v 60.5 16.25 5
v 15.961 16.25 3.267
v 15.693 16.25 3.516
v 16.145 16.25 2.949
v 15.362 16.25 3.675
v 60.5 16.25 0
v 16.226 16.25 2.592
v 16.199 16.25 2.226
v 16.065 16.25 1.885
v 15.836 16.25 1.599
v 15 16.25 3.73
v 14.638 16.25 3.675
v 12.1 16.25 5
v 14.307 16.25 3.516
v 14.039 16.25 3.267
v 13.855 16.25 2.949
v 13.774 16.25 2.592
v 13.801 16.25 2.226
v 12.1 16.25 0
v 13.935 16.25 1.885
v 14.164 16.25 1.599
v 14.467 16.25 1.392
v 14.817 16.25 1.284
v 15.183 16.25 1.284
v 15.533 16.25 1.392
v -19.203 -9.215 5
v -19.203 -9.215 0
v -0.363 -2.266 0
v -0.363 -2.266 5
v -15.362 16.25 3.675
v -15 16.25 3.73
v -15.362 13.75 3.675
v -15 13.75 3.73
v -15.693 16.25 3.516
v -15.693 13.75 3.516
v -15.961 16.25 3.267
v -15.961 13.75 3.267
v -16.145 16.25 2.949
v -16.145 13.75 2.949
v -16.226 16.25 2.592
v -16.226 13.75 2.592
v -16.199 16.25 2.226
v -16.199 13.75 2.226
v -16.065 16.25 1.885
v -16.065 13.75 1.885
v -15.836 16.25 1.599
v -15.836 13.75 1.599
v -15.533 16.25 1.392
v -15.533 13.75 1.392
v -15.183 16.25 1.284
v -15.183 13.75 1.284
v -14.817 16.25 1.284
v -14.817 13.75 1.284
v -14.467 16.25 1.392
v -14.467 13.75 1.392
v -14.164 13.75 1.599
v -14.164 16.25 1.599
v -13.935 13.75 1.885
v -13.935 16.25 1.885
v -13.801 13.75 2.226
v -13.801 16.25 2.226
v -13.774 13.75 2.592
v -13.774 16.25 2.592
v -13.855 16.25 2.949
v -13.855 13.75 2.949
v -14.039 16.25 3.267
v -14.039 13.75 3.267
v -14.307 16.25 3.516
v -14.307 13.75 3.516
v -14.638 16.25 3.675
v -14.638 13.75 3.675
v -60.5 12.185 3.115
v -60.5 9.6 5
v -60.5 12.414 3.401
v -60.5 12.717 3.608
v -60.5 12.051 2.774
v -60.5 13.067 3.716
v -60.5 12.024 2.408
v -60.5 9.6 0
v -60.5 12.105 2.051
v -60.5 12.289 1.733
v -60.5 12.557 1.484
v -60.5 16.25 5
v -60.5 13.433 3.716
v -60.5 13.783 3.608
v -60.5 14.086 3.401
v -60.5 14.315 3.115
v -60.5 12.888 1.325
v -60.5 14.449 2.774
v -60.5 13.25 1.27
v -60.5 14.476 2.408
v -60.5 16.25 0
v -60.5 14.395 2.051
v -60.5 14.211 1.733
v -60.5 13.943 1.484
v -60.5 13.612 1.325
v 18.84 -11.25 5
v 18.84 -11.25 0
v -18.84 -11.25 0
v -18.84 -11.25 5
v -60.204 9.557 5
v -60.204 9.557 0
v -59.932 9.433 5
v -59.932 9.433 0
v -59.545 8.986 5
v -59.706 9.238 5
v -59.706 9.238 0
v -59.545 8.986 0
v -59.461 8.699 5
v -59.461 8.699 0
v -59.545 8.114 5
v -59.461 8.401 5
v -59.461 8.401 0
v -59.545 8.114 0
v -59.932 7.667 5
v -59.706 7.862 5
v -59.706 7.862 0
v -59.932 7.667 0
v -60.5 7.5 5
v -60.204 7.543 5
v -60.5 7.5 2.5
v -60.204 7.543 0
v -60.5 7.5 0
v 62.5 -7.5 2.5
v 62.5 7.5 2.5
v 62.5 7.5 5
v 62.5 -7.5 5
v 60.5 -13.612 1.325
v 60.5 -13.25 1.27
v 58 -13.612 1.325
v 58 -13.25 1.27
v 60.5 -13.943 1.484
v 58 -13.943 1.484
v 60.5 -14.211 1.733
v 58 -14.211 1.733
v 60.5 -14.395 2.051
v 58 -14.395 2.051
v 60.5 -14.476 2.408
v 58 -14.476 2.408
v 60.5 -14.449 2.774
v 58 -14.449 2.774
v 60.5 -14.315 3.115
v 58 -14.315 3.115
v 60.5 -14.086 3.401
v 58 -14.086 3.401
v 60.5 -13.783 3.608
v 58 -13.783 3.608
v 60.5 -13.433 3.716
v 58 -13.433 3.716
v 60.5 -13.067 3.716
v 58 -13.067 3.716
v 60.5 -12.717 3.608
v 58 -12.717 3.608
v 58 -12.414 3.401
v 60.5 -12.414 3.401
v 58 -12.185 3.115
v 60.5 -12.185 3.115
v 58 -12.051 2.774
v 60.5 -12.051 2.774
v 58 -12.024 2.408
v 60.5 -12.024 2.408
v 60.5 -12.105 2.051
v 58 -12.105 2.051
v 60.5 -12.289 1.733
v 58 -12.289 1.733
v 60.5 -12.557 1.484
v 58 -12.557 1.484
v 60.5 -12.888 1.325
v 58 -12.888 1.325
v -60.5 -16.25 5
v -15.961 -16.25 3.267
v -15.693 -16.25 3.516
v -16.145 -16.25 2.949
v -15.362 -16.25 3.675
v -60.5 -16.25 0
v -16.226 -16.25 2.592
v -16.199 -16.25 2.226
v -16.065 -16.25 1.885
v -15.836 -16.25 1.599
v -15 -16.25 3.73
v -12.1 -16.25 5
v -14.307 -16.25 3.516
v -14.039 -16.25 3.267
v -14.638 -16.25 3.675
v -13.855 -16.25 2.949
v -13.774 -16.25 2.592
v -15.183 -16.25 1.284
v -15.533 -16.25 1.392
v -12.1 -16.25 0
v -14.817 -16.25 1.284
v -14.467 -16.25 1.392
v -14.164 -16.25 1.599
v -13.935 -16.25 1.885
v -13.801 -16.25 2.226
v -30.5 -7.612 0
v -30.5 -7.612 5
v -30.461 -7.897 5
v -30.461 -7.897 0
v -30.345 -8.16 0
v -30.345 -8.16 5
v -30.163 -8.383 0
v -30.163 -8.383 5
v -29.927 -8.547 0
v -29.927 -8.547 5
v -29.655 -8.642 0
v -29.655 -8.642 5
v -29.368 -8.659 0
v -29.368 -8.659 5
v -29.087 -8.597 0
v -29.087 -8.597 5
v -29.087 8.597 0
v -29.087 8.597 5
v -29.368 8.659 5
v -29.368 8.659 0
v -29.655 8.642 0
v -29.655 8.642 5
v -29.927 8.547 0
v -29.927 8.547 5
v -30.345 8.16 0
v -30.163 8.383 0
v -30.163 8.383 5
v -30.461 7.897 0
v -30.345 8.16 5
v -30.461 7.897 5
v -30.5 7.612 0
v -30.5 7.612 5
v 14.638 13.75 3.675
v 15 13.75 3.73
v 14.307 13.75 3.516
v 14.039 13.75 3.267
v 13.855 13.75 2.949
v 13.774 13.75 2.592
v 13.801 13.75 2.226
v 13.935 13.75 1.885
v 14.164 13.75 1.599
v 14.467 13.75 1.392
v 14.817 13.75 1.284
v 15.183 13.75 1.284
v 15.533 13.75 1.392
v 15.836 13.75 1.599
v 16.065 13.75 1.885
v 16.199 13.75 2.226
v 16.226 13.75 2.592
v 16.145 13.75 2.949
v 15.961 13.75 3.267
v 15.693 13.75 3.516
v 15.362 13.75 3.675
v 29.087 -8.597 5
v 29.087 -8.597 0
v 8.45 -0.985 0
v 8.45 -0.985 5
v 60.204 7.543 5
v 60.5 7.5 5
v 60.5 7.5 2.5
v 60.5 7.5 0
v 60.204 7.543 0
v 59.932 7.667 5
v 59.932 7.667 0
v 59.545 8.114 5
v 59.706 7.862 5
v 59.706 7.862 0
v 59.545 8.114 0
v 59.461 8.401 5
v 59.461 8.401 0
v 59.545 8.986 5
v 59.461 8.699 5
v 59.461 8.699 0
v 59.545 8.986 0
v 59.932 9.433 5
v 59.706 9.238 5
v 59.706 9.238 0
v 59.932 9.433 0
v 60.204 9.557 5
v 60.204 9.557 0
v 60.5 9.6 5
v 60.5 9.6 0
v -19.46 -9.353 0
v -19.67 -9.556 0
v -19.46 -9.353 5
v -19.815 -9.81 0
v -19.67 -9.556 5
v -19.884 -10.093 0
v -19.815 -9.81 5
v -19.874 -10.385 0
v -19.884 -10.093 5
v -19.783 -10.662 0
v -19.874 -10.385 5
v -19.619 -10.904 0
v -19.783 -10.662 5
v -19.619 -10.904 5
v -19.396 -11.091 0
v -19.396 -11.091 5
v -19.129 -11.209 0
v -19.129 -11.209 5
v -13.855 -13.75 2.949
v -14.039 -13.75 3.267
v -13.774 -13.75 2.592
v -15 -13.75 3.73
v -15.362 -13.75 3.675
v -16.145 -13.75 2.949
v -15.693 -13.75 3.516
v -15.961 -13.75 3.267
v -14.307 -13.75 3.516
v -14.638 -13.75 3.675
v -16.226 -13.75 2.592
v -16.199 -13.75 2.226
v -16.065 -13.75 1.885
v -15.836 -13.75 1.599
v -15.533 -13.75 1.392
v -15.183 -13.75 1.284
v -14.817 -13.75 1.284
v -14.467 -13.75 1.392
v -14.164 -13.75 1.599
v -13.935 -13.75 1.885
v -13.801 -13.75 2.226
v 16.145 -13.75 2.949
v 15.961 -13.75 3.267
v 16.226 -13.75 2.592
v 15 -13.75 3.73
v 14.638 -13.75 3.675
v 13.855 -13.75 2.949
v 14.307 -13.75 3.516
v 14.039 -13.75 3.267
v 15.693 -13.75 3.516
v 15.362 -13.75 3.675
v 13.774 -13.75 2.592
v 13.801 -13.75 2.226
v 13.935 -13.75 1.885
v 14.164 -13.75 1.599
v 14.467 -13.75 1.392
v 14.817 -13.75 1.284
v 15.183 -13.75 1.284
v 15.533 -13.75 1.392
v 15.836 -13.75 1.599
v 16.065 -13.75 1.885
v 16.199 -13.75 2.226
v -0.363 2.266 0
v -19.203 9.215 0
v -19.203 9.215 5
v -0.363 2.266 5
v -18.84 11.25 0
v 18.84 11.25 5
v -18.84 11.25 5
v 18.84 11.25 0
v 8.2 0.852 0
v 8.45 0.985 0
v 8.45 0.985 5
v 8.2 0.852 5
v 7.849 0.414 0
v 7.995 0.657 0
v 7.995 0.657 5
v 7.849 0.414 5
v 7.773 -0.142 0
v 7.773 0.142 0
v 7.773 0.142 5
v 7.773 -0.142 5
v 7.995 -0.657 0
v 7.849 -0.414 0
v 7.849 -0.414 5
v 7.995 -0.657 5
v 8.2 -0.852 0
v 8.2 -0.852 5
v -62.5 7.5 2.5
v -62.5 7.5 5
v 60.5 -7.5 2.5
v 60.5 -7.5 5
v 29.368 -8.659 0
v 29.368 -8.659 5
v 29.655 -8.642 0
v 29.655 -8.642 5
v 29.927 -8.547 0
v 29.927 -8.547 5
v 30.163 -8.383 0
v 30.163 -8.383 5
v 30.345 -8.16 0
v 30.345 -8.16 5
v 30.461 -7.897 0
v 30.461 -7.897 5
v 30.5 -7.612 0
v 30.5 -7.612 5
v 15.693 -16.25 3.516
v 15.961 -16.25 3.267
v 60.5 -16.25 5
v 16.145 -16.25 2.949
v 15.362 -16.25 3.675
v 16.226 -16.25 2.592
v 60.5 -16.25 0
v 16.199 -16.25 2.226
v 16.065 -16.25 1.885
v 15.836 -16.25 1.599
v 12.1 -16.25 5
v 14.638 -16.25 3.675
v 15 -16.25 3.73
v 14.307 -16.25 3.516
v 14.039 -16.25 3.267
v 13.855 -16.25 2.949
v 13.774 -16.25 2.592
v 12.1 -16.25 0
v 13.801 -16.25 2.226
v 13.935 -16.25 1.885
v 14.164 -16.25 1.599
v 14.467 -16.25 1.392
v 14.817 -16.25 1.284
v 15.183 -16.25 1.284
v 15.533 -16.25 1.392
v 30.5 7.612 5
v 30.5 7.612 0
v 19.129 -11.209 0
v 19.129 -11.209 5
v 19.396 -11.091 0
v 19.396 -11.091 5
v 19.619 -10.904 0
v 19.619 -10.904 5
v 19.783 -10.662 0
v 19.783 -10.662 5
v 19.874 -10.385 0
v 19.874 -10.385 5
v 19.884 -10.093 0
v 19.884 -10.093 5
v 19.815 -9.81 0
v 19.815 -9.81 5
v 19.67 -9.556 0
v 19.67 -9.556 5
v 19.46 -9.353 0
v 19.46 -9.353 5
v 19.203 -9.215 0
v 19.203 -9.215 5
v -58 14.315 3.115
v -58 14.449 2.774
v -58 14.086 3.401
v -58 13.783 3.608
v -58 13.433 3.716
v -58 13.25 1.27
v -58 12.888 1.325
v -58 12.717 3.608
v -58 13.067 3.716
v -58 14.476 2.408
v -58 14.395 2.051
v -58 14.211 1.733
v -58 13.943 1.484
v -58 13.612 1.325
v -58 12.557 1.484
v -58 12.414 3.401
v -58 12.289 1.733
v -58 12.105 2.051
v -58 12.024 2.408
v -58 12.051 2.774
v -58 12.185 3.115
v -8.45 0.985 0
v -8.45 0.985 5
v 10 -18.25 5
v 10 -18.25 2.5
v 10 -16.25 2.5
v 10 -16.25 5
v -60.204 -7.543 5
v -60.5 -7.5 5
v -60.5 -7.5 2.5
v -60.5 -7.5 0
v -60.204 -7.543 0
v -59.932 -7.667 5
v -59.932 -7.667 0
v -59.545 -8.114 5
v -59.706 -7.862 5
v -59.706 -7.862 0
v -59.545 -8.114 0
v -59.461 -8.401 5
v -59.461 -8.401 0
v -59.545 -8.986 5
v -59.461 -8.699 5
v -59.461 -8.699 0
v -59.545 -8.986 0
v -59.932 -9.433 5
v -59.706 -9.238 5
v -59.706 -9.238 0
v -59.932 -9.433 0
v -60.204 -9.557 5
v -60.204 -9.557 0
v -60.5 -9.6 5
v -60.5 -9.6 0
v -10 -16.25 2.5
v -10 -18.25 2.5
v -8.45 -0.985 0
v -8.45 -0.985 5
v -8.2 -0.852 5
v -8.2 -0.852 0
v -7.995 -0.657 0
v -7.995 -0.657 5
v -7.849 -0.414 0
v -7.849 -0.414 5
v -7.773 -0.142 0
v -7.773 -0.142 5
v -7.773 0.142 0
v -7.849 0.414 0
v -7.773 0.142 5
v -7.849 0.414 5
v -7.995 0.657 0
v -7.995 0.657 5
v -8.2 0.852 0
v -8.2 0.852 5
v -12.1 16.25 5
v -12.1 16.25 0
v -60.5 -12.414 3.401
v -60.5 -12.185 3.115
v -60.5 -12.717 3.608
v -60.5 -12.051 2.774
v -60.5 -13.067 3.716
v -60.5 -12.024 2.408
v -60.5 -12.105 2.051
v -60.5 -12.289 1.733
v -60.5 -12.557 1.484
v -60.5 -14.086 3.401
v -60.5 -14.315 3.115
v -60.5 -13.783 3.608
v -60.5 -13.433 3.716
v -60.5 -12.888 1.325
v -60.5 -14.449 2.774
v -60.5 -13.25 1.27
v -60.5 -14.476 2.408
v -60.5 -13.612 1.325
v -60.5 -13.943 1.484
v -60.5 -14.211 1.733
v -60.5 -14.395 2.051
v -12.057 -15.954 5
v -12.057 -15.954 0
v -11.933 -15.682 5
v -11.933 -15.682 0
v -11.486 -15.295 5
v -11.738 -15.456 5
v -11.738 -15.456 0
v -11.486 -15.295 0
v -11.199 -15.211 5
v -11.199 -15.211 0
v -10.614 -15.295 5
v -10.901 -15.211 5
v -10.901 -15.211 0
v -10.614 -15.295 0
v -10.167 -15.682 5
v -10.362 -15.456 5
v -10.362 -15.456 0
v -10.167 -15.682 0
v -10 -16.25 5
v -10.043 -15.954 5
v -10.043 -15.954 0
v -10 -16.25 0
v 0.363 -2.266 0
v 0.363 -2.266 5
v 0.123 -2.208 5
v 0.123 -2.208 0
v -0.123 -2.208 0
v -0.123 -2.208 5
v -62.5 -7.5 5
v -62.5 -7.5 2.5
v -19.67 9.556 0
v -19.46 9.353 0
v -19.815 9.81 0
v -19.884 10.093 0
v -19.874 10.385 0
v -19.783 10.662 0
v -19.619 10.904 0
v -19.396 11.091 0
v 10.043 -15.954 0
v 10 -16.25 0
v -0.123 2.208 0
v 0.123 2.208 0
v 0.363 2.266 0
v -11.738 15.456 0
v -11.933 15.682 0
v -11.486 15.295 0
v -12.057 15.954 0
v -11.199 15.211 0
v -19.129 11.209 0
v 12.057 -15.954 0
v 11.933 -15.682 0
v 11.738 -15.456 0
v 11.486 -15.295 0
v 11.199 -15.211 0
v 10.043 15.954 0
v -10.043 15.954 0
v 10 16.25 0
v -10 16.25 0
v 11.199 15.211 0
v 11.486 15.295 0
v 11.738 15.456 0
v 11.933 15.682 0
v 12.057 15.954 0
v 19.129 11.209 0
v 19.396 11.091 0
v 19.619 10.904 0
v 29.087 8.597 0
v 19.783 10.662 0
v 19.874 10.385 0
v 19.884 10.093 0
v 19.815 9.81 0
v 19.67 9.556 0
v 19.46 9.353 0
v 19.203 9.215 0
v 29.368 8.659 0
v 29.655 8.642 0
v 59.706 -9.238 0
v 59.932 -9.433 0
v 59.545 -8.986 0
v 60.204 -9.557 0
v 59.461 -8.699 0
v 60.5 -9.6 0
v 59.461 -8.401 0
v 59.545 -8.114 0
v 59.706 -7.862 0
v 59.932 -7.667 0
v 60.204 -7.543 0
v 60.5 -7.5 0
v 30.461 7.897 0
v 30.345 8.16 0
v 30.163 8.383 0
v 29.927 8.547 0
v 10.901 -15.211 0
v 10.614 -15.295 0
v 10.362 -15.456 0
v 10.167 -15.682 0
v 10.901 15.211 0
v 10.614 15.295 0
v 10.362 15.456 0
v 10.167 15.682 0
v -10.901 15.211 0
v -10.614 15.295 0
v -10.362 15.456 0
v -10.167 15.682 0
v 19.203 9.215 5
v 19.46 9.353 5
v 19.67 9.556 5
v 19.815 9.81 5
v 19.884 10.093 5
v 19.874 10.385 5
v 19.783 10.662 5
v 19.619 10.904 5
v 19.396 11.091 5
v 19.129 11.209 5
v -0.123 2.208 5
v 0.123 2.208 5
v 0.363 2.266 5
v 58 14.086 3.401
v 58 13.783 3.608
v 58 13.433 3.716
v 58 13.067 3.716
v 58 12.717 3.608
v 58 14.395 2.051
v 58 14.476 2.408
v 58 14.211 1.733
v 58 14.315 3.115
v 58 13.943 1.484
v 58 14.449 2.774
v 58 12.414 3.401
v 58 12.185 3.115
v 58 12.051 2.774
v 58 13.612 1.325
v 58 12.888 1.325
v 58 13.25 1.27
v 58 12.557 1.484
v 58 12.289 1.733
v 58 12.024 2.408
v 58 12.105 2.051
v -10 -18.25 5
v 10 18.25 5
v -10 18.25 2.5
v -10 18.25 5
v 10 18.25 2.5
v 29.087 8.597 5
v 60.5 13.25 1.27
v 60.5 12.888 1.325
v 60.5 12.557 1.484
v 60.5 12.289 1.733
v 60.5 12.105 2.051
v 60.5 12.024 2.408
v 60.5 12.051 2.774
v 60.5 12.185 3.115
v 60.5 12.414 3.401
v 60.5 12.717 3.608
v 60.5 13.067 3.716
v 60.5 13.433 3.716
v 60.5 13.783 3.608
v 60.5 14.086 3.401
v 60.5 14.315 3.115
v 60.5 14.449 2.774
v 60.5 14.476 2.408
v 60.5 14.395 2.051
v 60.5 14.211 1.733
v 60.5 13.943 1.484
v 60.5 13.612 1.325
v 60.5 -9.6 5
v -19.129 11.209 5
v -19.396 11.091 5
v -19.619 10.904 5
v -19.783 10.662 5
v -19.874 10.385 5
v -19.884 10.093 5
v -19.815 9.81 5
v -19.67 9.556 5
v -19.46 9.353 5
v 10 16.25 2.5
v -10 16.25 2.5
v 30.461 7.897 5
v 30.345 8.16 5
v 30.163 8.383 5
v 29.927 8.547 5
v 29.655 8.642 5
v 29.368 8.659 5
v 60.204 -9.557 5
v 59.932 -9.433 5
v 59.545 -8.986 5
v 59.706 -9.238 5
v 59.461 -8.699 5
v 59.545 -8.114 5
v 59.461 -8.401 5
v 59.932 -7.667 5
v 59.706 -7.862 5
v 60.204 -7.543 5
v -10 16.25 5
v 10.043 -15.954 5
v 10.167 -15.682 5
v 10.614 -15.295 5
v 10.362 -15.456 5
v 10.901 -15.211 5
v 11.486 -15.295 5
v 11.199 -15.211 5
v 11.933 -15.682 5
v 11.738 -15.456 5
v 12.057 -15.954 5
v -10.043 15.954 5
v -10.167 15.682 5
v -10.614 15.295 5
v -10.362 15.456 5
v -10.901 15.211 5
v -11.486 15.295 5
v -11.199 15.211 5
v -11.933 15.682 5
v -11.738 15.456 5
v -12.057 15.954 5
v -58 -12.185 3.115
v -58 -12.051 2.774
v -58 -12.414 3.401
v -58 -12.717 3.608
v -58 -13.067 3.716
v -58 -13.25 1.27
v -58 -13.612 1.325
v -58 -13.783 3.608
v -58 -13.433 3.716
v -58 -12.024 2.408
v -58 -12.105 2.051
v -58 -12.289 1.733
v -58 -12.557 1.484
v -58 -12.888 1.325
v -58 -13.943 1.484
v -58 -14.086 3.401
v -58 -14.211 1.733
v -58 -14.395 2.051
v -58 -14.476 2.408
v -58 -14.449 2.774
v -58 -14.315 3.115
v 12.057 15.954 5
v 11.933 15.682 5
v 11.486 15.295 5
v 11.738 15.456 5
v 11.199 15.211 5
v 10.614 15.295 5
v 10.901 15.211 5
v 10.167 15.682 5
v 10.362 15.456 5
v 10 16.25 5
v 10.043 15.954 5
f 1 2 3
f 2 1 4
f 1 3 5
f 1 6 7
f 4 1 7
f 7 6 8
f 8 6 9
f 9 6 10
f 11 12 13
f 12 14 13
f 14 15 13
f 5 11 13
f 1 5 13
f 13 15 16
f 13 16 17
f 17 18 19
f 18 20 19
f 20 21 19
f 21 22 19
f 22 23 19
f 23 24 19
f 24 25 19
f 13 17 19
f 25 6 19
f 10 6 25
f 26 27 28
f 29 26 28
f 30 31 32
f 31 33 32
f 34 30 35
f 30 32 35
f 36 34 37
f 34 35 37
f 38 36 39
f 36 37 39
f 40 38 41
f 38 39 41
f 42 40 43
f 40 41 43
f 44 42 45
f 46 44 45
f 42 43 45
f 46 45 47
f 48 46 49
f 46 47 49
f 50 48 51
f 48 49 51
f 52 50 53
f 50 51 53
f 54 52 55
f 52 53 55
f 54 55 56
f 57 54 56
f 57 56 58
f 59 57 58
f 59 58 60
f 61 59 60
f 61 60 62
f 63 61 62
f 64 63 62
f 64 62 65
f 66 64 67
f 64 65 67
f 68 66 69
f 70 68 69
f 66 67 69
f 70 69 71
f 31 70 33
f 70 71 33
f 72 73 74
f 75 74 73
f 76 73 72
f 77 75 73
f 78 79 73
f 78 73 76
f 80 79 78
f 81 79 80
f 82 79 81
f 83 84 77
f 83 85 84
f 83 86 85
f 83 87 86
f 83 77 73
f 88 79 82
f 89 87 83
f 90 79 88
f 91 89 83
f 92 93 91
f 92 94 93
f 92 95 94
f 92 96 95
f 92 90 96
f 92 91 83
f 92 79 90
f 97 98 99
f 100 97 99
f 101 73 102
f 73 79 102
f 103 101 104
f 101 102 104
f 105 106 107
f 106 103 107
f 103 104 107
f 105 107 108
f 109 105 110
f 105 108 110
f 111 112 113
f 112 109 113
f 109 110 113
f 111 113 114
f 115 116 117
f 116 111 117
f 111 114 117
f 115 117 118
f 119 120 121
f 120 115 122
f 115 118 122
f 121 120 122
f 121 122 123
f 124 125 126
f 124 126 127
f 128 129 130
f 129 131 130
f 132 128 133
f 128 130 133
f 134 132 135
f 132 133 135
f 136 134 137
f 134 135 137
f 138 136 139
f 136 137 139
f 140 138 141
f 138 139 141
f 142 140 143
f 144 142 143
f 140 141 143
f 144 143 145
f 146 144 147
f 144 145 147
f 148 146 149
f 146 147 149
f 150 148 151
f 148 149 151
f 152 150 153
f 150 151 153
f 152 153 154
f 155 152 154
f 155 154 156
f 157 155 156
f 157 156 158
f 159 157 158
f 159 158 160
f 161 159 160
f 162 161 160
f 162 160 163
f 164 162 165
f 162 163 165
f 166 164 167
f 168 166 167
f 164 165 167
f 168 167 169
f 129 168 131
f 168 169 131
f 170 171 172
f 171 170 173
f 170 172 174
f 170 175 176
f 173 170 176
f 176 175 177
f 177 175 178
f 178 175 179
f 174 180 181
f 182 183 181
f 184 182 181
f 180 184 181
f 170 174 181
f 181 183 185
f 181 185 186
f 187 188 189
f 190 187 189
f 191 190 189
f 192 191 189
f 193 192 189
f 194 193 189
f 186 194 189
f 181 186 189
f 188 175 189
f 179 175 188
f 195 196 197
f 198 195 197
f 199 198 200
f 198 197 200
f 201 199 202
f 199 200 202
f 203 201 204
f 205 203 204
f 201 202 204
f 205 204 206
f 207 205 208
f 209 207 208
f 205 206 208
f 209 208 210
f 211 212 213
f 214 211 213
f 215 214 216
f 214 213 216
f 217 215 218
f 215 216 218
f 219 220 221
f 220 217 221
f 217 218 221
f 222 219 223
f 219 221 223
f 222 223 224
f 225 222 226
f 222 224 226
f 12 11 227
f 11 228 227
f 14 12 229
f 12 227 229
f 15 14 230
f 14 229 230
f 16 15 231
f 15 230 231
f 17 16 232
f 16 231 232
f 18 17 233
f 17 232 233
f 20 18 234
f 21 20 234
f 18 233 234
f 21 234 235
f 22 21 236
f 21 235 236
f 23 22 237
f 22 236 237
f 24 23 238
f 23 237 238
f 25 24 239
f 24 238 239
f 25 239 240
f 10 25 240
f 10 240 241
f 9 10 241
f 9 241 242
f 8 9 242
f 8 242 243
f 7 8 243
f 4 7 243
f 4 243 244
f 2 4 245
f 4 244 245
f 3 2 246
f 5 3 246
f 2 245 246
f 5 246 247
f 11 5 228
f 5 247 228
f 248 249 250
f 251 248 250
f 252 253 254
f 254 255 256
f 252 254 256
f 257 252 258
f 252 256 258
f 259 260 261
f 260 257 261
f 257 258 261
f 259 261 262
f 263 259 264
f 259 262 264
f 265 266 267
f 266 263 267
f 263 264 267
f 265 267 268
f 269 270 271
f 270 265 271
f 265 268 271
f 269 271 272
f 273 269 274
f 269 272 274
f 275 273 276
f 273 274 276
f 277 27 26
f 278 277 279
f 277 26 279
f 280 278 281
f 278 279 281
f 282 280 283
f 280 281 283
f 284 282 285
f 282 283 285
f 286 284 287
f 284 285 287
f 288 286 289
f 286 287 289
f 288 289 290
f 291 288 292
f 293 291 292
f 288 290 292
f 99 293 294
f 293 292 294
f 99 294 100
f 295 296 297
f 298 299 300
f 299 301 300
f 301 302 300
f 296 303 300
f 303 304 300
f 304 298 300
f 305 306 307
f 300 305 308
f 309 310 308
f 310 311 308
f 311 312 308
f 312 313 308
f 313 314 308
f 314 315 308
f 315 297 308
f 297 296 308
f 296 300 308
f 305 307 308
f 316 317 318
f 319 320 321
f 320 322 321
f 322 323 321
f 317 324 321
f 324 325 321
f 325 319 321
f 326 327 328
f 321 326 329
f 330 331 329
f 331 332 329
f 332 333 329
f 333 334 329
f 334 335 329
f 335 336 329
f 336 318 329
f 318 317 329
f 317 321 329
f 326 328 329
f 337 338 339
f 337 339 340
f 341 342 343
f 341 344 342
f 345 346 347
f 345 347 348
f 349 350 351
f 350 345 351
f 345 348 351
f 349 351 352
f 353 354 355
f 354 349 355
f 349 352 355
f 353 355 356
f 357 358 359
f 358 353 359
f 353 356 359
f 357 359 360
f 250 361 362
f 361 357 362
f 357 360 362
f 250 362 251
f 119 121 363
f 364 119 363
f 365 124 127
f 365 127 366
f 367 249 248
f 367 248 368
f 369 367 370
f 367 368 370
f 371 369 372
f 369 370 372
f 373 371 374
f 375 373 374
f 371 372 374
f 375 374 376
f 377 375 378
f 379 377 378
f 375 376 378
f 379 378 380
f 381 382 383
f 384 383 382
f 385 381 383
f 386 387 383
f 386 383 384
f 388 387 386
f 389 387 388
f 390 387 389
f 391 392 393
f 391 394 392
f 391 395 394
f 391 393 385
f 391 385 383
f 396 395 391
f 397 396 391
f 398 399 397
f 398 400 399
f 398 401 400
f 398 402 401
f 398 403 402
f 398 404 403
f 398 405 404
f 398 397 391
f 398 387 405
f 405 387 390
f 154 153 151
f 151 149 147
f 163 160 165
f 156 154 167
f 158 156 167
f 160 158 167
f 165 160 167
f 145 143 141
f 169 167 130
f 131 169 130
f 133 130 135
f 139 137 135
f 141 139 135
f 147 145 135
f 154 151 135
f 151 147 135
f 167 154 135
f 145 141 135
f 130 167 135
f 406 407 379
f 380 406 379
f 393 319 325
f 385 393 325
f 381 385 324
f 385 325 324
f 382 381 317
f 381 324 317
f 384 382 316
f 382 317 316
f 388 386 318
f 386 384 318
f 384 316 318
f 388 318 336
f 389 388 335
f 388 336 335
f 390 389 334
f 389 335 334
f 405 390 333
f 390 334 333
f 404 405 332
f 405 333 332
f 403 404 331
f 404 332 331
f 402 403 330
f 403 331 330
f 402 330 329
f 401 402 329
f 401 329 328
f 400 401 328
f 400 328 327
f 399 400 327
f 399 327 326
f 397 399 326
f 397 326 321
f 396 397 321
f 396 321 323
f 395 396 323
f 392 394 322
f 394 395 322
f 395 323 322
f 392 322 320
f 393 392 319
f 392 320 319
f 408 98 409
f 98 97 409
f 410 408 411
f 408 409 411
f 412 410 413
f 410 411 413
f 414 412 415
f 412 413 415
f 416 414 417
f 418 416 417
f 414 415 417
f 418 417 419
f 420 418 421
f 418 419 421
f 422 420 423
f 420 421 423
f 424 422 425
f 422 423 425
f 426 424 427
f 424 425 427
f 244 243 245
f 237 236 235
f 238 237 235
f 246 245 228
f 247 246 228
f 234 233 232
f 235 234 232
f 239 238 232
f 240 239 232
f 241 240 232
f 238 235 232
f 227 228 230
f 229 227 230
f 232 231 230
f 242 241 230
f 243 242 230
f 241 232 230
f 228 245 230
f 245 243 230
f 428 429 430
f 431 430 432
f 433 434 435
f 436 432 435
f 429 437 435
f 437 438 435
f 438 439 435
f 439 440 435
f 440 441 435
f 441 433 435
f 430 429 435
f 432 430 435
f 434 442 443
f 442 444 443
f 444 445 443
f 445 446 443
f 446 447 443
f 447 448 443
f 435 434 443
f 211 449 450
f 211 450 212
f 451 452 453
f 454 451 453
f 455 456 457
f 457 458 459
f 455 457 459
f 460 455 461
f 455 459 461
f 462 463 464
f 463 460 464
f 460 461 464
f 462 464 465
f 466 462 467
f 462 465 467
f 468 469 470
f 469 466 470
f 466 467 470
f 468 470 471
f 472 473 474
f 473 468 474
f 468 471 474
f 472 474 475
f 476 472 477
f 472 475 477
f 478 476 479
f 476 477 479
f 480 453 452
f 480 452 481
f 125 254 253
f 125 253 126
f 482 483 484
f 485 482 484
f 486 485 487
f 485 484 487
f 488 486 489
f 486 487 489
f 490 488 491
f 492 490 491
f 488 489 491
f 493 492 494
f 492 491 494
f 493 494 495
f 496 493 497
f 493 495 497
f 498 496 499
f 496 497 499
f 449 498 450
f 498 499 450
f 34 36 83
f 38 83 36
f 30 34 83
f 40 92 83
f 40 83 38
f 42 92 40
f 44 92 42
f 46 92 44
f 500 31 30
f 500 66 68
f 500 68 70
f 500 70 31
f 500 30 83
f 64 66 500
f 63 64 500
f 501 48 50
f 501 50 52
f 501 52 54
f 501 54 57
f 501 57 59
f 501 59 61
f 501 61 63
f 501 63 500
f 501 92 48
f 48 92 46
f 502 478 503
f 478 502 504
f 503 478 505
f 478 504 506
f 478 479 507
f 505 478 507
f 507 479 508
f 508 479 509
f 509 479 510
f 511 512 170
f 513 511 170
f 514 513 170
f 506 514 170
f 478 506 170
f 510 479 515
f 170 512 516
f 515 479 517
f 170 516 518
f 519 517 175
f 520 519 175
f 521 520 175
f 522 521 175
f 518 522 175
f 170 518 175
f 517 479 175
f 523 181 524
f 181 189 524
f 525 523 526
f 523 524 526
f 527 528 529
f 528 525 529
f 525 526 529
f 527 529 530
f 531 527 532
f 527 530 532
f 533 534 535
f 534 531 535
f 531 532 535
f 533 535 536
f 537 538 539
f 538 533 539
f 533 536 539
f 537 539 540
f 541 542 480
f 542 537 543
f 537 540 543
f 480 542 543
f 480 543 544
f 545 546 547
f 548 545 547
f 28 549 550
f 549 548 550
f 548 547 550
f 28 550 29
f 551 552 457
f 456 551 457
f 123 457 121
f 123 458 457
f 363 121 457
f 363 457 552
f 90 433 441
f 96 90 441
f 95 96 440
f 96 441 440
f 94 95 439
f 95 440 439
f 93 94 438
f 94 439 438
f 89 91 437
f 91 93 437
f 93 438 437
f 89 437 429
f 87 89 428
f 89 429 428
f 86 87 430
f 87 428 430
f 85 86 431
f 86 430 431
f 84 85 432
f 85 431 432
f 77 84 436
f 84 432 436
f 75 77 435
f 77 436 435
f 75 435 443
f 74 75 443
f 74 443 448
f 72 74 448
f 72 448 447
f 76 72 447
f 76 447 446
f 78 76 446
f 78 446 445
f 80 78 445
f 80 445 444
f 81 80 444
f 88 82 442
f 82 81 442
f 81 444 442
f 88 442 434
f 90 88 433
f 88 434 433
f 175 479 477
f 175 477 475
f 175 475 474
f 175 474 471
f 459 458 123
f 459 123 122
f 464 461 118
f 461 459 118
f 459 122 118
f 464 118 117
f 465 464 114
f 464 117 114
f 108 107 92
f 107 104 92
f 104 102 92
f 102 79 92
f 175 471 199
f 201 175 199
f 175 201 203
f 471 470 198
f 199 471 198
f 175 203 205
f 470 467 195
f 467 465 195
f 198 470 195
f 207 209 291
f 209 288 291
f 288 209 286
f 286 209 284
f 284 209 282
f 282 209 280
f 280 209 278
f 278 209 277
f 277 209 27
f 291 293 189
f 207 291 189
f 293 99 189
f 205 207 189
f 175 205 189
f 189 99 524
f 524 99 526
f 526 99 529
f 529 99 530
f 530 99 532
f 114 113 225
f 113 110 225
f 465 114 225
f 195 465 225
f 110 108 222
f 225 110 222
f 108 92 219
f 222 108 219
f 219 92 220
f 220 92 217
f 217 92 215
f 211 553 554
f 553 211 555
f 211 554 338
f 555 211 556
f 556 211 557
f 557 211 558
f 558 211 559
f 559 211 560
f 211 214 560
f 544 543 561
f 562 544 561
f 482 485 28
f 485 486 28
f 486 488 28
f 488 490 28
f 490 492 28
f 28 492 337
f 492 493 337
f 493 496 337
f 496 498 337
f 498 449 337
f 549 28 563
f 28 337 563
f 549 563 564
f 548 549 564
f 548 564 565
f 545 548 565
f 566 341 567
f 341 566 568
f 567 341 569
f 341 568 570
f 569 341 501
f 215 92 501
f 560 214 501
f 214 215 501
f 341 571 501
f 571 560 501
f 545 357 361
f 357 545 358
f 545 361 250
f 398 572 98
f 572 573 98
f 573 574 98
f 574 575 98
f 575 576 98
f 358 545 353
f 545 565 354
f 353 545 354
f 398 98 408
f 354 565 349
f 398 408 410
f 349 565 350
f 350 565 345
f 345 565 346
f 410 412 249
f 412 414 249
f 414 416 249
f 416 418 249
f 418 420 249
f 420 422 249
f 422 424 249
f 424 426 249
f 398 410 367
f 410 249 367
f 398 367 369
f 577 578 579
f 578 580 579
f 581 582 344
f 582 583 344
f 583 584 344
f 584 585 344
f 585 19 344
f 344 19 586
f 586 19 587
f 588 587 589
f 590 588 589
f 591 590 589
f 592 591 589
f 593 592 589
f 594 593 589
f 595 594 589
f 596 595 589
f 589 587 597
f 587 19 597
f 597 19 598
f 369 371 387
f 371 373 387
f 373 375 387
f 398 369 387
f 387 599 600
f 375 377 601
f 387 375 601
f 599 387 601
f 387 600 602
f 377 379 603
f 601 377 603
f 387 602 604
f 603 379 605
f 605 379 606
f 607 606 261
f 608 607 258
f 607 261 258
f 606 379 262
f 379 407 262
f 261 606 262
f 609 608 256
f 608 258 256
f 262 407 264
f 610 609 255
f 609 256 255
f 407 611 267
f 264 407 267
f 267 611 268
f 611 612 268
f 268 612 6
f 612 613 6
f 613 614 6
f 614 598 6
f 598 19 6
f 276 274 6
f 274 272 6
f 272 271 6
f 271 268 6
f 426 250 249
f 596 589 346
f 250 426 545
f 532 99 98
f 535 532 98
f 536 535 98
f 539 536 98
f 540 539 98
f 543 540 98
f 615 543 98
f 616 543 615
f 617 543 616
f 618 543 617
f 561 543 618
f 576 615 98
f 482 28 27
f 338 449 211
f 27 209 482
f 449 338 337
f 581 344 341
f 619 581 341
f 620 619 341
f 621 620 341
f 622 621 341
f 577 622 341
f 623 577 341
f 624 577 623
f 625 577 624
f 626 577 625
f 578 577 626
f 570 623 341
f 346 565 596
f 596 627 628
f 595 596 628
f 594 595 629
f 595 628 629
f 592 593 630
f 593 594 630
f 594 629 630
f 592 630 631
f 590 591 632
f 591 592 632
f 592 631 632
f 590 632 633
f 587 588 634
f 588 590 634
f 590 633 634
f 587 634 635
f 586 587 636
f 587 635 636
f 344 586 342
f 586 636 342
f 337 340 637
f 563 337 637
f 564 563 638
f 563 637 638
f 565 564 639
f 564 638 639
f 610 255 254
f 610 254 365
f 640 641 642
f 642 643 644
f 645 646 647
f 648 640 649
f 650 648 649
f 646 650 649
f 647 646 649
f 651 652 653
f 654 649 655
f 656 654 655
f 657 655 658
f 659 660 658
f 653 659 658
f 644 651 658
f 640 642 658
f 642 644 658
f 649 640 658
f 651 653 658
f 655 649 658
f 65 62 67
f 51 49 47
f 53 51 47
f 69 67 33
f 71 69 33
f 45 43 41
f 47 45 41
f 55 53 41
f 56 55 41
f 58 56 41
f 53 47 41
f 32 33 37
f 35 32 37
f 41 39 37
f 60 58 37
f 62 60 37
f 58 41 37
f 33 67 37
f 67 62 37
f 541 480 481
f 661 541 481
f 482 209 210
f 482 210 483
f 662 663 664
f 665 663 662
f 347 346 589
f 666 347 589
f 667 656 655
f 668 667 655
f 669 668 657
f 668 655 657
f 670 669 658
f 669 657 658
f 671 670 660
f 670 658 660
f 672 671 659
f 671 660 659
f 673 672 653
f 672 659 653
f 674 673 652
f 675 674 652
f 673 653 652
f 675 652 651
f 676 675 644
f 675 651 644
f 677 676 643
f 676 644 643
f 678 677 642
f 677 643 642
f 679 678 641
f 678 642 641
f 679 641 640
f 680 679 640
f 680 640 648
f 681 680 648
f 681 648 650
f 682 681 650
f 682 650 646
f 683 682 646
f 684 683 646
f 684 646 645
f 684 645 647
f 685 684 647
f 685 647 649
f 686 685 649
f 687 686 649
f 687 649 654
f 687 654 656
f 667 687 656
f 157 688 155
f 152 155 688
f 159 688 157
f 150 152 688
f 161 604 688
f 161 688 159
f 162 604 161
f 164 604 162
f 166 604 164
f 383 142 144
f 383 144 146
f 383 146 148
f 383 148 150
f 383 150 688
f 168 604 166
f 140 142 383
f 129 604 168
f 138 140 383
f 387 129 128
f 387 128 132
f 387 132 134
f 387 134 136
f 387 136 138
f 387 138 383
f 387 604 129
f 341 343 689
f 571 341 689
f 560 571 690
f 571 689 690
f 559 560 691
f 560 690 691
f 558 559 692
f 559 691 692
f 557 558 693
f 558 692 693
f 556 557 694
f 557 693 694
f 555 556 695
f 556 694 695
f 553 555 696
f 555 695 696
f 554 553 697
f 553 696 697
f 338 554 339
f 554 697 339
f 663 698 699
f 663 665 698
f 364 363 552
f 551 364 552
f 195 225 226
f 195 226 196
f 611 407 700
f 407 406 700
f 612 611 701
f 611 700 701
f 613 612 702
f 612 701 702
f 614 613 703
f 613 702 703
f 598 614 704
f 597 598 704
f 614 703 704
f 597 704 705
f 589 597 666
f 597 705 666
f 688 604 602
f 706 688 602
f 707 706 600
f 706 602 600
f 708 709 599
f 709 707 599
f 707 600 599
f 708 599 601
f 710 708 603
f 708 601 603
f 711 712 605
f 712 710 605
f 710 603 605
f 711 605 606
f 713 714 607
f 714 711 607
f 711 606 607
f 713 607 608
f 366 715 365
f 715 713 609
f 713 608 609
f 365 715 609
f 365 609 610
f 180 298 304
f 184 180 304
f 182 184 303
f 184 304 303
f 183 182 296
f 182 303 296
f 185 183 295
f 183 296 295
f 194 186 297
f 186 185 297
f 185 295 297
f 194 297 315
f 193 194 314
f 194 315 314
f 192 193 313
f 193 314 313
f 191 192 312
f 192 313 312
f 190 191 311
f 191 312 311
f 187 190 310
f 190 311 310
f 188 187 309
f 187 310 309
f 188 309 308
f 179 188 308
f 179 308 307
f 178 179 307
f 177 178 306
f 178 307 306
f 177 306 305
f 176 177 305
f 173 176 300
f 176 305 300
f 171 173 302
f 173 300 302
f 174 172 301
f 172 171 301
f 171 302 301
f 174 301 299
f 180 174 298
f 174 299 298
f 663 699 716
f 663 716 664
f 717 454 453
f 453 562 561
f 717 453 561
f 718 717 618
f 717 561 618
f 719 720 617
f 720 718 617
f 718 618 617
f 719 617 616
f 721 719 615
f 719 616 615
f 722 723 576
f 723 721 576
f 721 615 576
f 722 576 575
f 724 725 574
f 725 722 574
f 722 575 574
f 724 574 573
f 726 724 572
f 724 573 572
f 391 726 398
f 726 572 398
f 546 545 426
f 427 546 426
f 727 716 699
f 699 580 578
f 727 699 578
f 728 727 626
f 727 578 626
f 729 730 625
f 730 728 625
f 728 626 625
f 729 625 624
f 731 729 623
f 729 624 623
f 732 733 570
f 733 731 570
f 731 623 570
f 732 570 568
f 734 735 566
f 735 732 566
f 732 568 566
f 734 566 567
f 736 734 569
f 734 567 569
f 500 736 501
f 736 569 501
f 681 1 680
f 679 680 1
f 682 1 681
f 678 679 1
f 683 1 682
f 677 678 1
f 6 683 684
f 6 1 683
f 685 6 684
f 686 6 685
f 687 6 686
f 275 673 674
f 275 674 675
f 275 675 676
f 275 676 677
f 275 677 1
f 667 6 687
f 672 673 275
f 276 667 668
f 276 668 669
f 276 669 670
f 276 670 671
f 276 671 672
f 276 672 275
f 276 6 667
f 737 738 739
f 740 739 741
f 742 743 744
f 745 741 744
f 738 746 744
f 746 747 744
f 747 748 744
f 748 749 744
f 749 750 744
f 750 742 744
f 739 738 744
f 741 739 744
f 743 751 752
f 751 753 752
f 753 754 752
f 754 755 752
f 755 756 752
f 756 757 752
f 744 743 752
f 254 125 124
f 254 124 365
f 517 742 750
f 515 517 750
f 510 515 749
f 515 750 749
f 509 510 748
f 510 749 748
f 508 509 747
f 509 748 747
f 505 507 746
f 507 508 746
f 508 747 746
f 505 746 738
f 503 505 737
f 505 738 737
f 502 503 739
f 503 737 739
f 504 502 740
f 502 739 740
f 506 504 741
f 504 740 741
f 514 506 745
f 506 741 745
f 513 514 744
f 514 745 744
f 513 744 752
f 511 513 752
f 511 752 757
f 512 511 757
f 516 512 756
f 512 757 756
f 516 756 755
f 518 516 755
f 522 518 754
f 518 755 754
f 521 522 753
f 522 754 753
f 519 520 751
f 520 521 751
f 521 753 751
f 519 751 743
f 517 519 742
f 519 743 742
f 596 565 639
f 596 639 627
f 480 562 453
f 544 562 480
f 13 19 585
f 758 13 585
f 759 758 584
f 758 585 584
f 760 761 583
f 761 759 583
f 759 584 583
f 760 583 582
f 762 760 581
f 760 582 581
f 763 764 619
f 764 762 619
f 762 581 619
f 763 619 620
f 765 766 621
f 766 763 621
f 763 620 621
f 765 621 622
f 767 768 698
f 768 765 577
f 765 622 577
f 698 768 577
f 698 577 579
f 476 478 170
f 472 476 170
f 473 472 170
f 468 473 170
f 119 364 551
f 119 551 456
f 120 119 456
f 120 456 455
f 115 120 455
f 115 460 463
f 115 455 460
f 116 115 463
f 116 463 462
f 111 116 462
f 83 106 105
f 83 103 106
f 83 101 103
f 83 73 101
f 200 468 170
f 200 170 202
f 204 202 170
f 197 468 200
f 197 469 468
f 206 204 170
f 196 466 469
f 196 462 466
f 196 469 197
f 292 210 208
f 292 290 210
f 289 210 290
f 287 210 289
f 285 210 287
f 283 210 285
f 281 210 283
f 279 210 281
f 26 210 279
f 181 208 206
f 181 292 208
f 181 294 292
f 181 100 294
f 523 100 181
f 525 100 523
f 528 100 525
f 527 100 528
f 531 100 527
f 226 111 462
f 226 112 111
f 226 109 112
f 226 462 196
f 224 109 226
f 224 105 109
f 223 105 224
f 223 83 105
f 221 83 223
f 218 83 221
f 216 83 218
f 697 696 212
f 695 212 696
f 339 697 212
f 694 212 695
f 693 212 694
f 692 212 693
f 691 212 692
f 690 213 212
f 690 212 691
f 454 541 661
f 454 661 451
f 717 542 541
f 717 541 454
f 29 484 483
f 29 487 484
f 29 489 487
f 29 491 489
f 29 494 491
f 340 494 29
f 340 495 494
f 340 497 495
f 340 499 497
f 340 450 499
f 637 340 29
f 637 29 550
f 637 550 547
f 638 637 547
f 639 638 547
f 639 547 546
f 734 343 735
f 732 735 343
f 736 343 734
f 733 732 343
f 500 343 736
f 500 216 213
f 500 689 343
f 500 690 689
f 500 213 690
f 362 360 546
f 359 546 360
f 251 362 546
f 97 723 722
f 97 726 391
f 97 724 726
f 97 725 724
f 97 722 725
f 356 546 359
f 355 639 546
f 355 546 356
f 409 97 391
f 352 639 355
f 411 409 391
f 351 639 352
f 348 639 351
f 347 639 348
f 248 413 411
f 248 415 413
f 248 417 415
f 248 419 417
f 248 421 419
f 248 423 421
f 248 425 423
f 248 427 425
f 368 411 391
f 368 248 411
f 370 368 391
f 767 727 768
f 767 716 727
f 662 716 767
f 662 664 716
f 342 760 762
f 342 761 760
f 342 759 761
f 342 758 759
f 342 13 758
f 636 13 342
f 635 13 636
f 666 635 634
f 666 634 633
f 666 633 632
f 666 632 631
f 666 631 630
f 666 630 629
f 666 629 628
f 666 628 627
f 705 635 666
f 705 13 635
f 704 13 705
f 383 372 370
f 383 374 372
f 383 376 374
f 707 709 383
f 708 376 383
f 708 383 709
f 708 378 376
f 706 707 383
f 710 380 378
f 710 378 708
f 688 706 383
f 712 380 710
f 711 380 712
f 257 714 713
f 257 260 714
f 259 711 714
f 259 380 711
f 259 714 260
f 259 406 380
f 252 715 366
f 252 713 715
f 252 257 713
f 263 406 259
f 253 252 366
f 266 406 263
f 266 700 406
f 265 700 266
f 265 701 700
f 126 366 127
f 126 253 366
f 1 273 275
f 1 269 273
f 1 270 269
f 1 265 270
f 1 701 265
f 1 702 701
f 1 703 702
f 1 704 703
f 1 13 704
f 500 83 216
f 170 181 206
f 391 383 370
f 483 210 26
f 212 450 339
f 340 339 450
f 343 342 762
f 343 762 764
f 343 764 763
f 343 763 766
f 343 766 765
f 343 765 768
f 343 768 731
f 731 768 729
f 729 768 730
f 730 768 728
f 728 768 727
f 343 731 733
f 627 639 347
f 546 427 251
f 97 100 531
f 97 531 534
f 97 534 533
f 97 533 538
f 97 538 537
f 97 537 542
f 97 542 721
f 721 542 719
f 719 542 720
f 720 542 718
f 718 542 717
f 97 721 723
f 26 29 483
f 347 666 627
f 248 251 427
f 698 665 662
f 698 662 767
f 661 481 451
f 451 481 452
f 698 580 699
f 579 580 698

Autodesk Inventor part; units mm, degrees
ref_plane "YZ Plane" through (0, 0, 0) normal (1, 0, 0) x (0, 1, 0)
ref_plane "XZ Plane" through (0, 0, 0) normal (0, 1, 0) x (-1, 0, 0)
ref_plane "XY Plane" through (0, 0, 0) normal (0, 0, 1) x (1, 0, 0)
sketch "スケッチ1" plane through (0, 0, 0) normal (0, 0, 1) x (1, 0, 0)
  line L0 (-60.5, 9.6) -> (-60.5, 16.25)
  line L1 (-60.5, 16.25) -> (-20, 16.25)
  line L2 (20, 16.25) -> (60.5, 16.25)
  line L3 (60.5, 16.25) -> (60.5, 9.6)
  line L4 (0, 0) -> (0, 16.25) construction
  line L5 (0, 0) -> (62.5, 0) construction
  line L6 (60.5, 7.5) -> (62.5, 7.5)
  line L7 (62.5, 7.5) -> (62.5, -7.5)
  line L8 (62.5, -7.5) -> (60.5, -7.5)
  line L9 (-20, -16.25) -> (20, -16.25) construction
  line L10 (20, -16.25) -> (20, 16.25) construction
  line L11 (20, 16.25) -> (-20, 16.25) construction
  line L12 (-20, 16.25) -> (-20, -16.25) construction
  line L13 (-20, -16.25) -> (20, 16.25) construction
  line L14 (20, -16.25) -> (-20, 16.25) construction
  line L15 (-60.5, -16.25) -> (60.5, -16.25) construction
  line L16 (60.5, -16.25) -> (60.5, 16.25) construction
  line L17 (60.5, 16.25) -> (-60.5, 16.25) construction
  line L18 (-60.5, 16.25) -> (-60.5, -16.25) construction
  line L19 (-60.5, -16.25) -> (60.5, 16.25) construction
  line L20 (60.5, -16.25) -> (-60.5, 16.25) construction
  arc A0 (60.5, 9.6) -> (60.5, 7.5) centre (60.5, 8.55) ccw
  arc A1 (60.5, -7.5) -> (60.5, -9.6) centre (60.5, -8.55) ccw
  line L21 (60.5, -9.6) -> (60.5, -16.25)
  line L22 (60.5, -16.25) -> (20, -16.25)
  line L23 (20, -16.25) -> (12.1, -16.25)
  line L24 (-20, 16.25) -> (-12.1, 16.25)
  line L25 (-10, 16.25) -> (-10, 18.25)
  line L26 (-10, 18.25) -> (10, 18.25)
  line L27 (10, 18.25) -> (10, 16.25)
  line L28 (20, 16.25) -> (12.1, 16.25)
  arc A2 (-12.1, 16.25) -> (-10, 16.25) centre (-11.05, 16.25) ccw
  arc A3 (10, 16.25) -> (12.1, 16.25) centre (11.05, 16.25) ccw
  line L29 (-60.5, 7.5) -> (-62.5, 7.5)
  line L30 (-62.5, 7.5) -> (-62.5, -7.5)
  line L31 (-62.5, -7.5) -> (-60.5, -7.5)
  arc A4 (-60.5, 7.5) -> (-60.5, 9.6) centre (-60.5, 8.55) ccw
  arc A5 (-60.5, -9.6) -> (-60.5, -7.5) centre (-60.5, -8.55) ccw
  line L32 (-60.5, -9.6) -> (-60.5, -16.25)
  line L33 (-60.5, -16.25) -> (-20, -16.25)
  line L34 (-20, -16.25) -> (-12.1, -16.25)
  line L35 (-10, -16.25) -> (-10, -18.25)
  line L36 (-10, -18.25) -> (10, -18.25)
  line L37 (10, -18.25) -> (10, -16.25)
  arc A6 (-10, -16.25) -> (-12.1, -16.25) centre (-11.05, -16.25) ccw
  arc A7 (12.1, -16.25) -> (10, -16.25) centre (11.05, -16.25) ccw
  line L38 (-16.55, 19.1799) -> (-13.45, 19.1799) construction
  line L39 (-13.45, 19.1799) -> (-13.45, 12.4242) construction
  line L40 (-13.45, 12.4242) -> (-16.55, 12.4242) construction
  line L41 (-16.55, 12.4242) -> (-16.55, 19.1799) construction
  line L42 (-15, 19.1799) -> (-15, 12.4242) construction
  point P0 (0, 18.25)
  point P1 (0, 0)
  dimension "d0" = 1.05
  dimension "d1" = 32.5
  dimension "d2" = 121
  dimension "d3" = 40
  dimension "d23" = 2
  dimension "d30" = 2
  dimension "d34" = 8.75
  dimension "d53" = 20
  dimension "d54" = 3.1
  dimension "d55" = 5
  dimension "d85" = 32.5
extrude "押し出し1" add sketch "スケッチ1" along normal blind 5
sketch "スケッチ2" plane through (0, 0, 0) normal (0, 0, -1) x (-1, 0, 0)
  line L0 (60.5, 9.6) -> (60.5, 16.25) projected
  line L1 (-60.5, 16.25) -> (-60.5, 9.6) projected
  line L2 (-68.6427, 17.3125) -> (-60.5, 17.3125)
  line L3 (-60.5, 17.3125) -> (-60.5, -16.751)
  line L4 (-60.5, -16.751) -> (-68.6427, -16.751)
  line L5 (-68.6427, -16.751) -> (-68.6427, 17.3125)
  line L6 (60.5, 21.1805) -> (66.358, 21.1805)
  line L7 (66.358, 21.1805) -> (66.358, -13.6193)
  line L8 (66.358, -13.6193) -> (60.5, -13.6193)
  line L9 (60.5, -13.6193) -> (60.5, 21.1805)
  line L10 (-20, -16.25) -> (-12.1, -16.25)
  line L11 (-17.1371, 25.1848) -> (11.8342, 25.1848)
  line L12 (11.8342, 25.1848) -> (11.8342, 16.25)
  line L13 (11.8342, 16.25) -> (-17.1371, 16.25)
  line L14 (-17.1371, 16.25) -> (-17.1371, 25.1848)
  line L15 (-13.151, -21.5857) -> (17.7795, -21.5857)
  line L16 (17.7795, -21.5857) -> (17.7795, -16.25)
  line L17 (17.7795, -16.25) -> (-13.151, -16.25)
  line L18 (-13.151, -16.25) -> (-13.151, -21.5857)
  line L19 (-12.1, 16.25) -> (-60.5, 16.25)
  line L20 (-60.5, -16.25) -> (-12.1, -16.25)
  point P0 (0, 0)
extrude "押し出し2" cut sketch "スケッチ2" against normal blind 2.5
sketch "スケッチ3" plane through (12.1, 16.25, 0) normal (0, 1, 0) x (1, 0, 0)
  line L0 (-2.1, 0) -> (-2.1, -5) projected
  line L1 (-2.1, -5) -> (-22.1, -5) construction
  line L2 (-12.1, -5) -> (-12.1, 7.4607) construction
  line L3 (48.4, 0) -> (48.4, -5) projected
  point P0 (-12.1, 0)
  point P1 (2.9, -2.5)
  point P2 (-27.1, -2.5)
  point P3 (48.4, -2.5)
  dimension "d60" = 5
hole "穴1" at (15, 16.25, 2.5) at (-15, 16.25, 2.5) direction (0, -1, 0) diameter 2.459 depth 2.5 thread size "M3x0.5" class "6H" standard "ISO Metric profile"
mirror "ミラー1" about plane through (0, 0, 0) normal (0, 1, 0) of "穴1"
sketch "スケッチ4" plane through (60.5, -16.25, 5) normal (1, 0, 0) x (0, 0, -1)
  line L0 (5, 16.25) -> (0, 16.25) construction
  line L1 (0, 23.75) -> (0, 8.75) construction
  line L2 (5, 6.65) -> (0, 6.65) projected
  line L3 (5, 0) -> (0, 0) projected
  point P0 (2.5, 3)
  point P1 (2.5, 29.5)
  point P2 (2.5, 6.65)
  dimension "d86" = 3
  dimension "d87" = 26.5
hole "穴2" at (60.5, -13.25, 2.5) at (60.5, 13.25, 2.5) direction (-1, 0, 0) diameter 2.459 depth 2.5 thread size "M3x0.5" class "6H" standard "ISO Metric profile"
mirror "ミラー2" about plane through (0, 0, 0) normal (1, 0, 0) of "穴2"
sketch "スケッチ5" plane through (0, 0, 0) normal (0, 0, -1) x (-1, 0, 0)
  line L0 (10, 16.25) -> (-10, 16.25) projected
  line L1 (-60.5, 7.5) -> (-60.5, 9.6) projected
  line L2 (-30.5, -11.25) -> (30.5, -11.25) construction
  line L3 (30.5, -11.25) -> (30.5, 11.25) construction
  line L4 (30.5, 11.25) -> (-30.5, 11.25) construction
  line L5 (-30.5, 11.25) -> (-30.5, -11.25) construction
  line L6 (-30.5, -11.25) -> (30.5, 11.25) construction
  line L7 (30.5, -11.25) -> (-30.5, 11.25) construction
  line L8 (-30.5, 9.1183) -> (-30.5, -9.1183)
  line L9 (-30.5, -9.1183) -> (-5.7793, 0)
  line L10 (-5.7793, 0) -> (-30.5, 9.1183)
  line L11 (-24.7207, 11.25) -> (24.7207, 11.25)
  line L12 (24.7207, 11.25) -> (0, 2.1317)
  line L13 (0, 2.1317) -> (-24.7207, 11.25)
  line L14 (-24.7207, -11.25) -> (24.7207, -11.25)
  line L15 (24.7207, -11.25) -> (0, -2.1317)
  line L16 (0, -2.1317) -> (-24.7207, -11.25)
  line L17 (30.5, 9.1183) -> (30.5, -9.1183)
  line L18 (30.5, -9.1183) -> (5.7793, 0)
  line L19 (5.7793, 0) -> (30.5, 9.1183)
  point P0 (-12.1, 16.25)
  point P1 (-20, 16.25)
  point P2 (-60.5, 16.25)
  point P3 (0, 0)
  dimension "d76" = 5
  dimension "d77" = 30
  dimension "d78" = 4
  dimension "d79" = 4
  dimension "d80" = 4
  dimension "d81" = 4
extrude "押し出し3" cut sketch "スケッチ5" against normal blind 10
fillet "フィレット1" radius 1.05 12 edges at (30.5, 9.1183, 2.5) (30.5, -9.1183, 2.5) (24.7207, 11.25, 2.5) (5.7793, 0, 2.5) (0, -2.1317, 2.5) (0, 2.1317, 2.5) (-30.5, -9.1183, 2.5) (24.7207, -11.25, 2.5) (-30.5, 9.1183, 2.5) (-24.7207, 11.25, 2.5) (-24.7207, -11.25, 2.5) (-5.7793, 0, 2.5)
equation "\"d85\" = d1"
equation "\"d60\" = d55"
equation "\"d79\" = d78"
equation "\"d80\" = d79"
equation "\"d81\" = d78"
equation "\"d48\" = 26.5"
equation "\"d52\" = 5"
properties part number "Trunk_chest_back_forth_frame" material "アセタール樹脂、黒"
